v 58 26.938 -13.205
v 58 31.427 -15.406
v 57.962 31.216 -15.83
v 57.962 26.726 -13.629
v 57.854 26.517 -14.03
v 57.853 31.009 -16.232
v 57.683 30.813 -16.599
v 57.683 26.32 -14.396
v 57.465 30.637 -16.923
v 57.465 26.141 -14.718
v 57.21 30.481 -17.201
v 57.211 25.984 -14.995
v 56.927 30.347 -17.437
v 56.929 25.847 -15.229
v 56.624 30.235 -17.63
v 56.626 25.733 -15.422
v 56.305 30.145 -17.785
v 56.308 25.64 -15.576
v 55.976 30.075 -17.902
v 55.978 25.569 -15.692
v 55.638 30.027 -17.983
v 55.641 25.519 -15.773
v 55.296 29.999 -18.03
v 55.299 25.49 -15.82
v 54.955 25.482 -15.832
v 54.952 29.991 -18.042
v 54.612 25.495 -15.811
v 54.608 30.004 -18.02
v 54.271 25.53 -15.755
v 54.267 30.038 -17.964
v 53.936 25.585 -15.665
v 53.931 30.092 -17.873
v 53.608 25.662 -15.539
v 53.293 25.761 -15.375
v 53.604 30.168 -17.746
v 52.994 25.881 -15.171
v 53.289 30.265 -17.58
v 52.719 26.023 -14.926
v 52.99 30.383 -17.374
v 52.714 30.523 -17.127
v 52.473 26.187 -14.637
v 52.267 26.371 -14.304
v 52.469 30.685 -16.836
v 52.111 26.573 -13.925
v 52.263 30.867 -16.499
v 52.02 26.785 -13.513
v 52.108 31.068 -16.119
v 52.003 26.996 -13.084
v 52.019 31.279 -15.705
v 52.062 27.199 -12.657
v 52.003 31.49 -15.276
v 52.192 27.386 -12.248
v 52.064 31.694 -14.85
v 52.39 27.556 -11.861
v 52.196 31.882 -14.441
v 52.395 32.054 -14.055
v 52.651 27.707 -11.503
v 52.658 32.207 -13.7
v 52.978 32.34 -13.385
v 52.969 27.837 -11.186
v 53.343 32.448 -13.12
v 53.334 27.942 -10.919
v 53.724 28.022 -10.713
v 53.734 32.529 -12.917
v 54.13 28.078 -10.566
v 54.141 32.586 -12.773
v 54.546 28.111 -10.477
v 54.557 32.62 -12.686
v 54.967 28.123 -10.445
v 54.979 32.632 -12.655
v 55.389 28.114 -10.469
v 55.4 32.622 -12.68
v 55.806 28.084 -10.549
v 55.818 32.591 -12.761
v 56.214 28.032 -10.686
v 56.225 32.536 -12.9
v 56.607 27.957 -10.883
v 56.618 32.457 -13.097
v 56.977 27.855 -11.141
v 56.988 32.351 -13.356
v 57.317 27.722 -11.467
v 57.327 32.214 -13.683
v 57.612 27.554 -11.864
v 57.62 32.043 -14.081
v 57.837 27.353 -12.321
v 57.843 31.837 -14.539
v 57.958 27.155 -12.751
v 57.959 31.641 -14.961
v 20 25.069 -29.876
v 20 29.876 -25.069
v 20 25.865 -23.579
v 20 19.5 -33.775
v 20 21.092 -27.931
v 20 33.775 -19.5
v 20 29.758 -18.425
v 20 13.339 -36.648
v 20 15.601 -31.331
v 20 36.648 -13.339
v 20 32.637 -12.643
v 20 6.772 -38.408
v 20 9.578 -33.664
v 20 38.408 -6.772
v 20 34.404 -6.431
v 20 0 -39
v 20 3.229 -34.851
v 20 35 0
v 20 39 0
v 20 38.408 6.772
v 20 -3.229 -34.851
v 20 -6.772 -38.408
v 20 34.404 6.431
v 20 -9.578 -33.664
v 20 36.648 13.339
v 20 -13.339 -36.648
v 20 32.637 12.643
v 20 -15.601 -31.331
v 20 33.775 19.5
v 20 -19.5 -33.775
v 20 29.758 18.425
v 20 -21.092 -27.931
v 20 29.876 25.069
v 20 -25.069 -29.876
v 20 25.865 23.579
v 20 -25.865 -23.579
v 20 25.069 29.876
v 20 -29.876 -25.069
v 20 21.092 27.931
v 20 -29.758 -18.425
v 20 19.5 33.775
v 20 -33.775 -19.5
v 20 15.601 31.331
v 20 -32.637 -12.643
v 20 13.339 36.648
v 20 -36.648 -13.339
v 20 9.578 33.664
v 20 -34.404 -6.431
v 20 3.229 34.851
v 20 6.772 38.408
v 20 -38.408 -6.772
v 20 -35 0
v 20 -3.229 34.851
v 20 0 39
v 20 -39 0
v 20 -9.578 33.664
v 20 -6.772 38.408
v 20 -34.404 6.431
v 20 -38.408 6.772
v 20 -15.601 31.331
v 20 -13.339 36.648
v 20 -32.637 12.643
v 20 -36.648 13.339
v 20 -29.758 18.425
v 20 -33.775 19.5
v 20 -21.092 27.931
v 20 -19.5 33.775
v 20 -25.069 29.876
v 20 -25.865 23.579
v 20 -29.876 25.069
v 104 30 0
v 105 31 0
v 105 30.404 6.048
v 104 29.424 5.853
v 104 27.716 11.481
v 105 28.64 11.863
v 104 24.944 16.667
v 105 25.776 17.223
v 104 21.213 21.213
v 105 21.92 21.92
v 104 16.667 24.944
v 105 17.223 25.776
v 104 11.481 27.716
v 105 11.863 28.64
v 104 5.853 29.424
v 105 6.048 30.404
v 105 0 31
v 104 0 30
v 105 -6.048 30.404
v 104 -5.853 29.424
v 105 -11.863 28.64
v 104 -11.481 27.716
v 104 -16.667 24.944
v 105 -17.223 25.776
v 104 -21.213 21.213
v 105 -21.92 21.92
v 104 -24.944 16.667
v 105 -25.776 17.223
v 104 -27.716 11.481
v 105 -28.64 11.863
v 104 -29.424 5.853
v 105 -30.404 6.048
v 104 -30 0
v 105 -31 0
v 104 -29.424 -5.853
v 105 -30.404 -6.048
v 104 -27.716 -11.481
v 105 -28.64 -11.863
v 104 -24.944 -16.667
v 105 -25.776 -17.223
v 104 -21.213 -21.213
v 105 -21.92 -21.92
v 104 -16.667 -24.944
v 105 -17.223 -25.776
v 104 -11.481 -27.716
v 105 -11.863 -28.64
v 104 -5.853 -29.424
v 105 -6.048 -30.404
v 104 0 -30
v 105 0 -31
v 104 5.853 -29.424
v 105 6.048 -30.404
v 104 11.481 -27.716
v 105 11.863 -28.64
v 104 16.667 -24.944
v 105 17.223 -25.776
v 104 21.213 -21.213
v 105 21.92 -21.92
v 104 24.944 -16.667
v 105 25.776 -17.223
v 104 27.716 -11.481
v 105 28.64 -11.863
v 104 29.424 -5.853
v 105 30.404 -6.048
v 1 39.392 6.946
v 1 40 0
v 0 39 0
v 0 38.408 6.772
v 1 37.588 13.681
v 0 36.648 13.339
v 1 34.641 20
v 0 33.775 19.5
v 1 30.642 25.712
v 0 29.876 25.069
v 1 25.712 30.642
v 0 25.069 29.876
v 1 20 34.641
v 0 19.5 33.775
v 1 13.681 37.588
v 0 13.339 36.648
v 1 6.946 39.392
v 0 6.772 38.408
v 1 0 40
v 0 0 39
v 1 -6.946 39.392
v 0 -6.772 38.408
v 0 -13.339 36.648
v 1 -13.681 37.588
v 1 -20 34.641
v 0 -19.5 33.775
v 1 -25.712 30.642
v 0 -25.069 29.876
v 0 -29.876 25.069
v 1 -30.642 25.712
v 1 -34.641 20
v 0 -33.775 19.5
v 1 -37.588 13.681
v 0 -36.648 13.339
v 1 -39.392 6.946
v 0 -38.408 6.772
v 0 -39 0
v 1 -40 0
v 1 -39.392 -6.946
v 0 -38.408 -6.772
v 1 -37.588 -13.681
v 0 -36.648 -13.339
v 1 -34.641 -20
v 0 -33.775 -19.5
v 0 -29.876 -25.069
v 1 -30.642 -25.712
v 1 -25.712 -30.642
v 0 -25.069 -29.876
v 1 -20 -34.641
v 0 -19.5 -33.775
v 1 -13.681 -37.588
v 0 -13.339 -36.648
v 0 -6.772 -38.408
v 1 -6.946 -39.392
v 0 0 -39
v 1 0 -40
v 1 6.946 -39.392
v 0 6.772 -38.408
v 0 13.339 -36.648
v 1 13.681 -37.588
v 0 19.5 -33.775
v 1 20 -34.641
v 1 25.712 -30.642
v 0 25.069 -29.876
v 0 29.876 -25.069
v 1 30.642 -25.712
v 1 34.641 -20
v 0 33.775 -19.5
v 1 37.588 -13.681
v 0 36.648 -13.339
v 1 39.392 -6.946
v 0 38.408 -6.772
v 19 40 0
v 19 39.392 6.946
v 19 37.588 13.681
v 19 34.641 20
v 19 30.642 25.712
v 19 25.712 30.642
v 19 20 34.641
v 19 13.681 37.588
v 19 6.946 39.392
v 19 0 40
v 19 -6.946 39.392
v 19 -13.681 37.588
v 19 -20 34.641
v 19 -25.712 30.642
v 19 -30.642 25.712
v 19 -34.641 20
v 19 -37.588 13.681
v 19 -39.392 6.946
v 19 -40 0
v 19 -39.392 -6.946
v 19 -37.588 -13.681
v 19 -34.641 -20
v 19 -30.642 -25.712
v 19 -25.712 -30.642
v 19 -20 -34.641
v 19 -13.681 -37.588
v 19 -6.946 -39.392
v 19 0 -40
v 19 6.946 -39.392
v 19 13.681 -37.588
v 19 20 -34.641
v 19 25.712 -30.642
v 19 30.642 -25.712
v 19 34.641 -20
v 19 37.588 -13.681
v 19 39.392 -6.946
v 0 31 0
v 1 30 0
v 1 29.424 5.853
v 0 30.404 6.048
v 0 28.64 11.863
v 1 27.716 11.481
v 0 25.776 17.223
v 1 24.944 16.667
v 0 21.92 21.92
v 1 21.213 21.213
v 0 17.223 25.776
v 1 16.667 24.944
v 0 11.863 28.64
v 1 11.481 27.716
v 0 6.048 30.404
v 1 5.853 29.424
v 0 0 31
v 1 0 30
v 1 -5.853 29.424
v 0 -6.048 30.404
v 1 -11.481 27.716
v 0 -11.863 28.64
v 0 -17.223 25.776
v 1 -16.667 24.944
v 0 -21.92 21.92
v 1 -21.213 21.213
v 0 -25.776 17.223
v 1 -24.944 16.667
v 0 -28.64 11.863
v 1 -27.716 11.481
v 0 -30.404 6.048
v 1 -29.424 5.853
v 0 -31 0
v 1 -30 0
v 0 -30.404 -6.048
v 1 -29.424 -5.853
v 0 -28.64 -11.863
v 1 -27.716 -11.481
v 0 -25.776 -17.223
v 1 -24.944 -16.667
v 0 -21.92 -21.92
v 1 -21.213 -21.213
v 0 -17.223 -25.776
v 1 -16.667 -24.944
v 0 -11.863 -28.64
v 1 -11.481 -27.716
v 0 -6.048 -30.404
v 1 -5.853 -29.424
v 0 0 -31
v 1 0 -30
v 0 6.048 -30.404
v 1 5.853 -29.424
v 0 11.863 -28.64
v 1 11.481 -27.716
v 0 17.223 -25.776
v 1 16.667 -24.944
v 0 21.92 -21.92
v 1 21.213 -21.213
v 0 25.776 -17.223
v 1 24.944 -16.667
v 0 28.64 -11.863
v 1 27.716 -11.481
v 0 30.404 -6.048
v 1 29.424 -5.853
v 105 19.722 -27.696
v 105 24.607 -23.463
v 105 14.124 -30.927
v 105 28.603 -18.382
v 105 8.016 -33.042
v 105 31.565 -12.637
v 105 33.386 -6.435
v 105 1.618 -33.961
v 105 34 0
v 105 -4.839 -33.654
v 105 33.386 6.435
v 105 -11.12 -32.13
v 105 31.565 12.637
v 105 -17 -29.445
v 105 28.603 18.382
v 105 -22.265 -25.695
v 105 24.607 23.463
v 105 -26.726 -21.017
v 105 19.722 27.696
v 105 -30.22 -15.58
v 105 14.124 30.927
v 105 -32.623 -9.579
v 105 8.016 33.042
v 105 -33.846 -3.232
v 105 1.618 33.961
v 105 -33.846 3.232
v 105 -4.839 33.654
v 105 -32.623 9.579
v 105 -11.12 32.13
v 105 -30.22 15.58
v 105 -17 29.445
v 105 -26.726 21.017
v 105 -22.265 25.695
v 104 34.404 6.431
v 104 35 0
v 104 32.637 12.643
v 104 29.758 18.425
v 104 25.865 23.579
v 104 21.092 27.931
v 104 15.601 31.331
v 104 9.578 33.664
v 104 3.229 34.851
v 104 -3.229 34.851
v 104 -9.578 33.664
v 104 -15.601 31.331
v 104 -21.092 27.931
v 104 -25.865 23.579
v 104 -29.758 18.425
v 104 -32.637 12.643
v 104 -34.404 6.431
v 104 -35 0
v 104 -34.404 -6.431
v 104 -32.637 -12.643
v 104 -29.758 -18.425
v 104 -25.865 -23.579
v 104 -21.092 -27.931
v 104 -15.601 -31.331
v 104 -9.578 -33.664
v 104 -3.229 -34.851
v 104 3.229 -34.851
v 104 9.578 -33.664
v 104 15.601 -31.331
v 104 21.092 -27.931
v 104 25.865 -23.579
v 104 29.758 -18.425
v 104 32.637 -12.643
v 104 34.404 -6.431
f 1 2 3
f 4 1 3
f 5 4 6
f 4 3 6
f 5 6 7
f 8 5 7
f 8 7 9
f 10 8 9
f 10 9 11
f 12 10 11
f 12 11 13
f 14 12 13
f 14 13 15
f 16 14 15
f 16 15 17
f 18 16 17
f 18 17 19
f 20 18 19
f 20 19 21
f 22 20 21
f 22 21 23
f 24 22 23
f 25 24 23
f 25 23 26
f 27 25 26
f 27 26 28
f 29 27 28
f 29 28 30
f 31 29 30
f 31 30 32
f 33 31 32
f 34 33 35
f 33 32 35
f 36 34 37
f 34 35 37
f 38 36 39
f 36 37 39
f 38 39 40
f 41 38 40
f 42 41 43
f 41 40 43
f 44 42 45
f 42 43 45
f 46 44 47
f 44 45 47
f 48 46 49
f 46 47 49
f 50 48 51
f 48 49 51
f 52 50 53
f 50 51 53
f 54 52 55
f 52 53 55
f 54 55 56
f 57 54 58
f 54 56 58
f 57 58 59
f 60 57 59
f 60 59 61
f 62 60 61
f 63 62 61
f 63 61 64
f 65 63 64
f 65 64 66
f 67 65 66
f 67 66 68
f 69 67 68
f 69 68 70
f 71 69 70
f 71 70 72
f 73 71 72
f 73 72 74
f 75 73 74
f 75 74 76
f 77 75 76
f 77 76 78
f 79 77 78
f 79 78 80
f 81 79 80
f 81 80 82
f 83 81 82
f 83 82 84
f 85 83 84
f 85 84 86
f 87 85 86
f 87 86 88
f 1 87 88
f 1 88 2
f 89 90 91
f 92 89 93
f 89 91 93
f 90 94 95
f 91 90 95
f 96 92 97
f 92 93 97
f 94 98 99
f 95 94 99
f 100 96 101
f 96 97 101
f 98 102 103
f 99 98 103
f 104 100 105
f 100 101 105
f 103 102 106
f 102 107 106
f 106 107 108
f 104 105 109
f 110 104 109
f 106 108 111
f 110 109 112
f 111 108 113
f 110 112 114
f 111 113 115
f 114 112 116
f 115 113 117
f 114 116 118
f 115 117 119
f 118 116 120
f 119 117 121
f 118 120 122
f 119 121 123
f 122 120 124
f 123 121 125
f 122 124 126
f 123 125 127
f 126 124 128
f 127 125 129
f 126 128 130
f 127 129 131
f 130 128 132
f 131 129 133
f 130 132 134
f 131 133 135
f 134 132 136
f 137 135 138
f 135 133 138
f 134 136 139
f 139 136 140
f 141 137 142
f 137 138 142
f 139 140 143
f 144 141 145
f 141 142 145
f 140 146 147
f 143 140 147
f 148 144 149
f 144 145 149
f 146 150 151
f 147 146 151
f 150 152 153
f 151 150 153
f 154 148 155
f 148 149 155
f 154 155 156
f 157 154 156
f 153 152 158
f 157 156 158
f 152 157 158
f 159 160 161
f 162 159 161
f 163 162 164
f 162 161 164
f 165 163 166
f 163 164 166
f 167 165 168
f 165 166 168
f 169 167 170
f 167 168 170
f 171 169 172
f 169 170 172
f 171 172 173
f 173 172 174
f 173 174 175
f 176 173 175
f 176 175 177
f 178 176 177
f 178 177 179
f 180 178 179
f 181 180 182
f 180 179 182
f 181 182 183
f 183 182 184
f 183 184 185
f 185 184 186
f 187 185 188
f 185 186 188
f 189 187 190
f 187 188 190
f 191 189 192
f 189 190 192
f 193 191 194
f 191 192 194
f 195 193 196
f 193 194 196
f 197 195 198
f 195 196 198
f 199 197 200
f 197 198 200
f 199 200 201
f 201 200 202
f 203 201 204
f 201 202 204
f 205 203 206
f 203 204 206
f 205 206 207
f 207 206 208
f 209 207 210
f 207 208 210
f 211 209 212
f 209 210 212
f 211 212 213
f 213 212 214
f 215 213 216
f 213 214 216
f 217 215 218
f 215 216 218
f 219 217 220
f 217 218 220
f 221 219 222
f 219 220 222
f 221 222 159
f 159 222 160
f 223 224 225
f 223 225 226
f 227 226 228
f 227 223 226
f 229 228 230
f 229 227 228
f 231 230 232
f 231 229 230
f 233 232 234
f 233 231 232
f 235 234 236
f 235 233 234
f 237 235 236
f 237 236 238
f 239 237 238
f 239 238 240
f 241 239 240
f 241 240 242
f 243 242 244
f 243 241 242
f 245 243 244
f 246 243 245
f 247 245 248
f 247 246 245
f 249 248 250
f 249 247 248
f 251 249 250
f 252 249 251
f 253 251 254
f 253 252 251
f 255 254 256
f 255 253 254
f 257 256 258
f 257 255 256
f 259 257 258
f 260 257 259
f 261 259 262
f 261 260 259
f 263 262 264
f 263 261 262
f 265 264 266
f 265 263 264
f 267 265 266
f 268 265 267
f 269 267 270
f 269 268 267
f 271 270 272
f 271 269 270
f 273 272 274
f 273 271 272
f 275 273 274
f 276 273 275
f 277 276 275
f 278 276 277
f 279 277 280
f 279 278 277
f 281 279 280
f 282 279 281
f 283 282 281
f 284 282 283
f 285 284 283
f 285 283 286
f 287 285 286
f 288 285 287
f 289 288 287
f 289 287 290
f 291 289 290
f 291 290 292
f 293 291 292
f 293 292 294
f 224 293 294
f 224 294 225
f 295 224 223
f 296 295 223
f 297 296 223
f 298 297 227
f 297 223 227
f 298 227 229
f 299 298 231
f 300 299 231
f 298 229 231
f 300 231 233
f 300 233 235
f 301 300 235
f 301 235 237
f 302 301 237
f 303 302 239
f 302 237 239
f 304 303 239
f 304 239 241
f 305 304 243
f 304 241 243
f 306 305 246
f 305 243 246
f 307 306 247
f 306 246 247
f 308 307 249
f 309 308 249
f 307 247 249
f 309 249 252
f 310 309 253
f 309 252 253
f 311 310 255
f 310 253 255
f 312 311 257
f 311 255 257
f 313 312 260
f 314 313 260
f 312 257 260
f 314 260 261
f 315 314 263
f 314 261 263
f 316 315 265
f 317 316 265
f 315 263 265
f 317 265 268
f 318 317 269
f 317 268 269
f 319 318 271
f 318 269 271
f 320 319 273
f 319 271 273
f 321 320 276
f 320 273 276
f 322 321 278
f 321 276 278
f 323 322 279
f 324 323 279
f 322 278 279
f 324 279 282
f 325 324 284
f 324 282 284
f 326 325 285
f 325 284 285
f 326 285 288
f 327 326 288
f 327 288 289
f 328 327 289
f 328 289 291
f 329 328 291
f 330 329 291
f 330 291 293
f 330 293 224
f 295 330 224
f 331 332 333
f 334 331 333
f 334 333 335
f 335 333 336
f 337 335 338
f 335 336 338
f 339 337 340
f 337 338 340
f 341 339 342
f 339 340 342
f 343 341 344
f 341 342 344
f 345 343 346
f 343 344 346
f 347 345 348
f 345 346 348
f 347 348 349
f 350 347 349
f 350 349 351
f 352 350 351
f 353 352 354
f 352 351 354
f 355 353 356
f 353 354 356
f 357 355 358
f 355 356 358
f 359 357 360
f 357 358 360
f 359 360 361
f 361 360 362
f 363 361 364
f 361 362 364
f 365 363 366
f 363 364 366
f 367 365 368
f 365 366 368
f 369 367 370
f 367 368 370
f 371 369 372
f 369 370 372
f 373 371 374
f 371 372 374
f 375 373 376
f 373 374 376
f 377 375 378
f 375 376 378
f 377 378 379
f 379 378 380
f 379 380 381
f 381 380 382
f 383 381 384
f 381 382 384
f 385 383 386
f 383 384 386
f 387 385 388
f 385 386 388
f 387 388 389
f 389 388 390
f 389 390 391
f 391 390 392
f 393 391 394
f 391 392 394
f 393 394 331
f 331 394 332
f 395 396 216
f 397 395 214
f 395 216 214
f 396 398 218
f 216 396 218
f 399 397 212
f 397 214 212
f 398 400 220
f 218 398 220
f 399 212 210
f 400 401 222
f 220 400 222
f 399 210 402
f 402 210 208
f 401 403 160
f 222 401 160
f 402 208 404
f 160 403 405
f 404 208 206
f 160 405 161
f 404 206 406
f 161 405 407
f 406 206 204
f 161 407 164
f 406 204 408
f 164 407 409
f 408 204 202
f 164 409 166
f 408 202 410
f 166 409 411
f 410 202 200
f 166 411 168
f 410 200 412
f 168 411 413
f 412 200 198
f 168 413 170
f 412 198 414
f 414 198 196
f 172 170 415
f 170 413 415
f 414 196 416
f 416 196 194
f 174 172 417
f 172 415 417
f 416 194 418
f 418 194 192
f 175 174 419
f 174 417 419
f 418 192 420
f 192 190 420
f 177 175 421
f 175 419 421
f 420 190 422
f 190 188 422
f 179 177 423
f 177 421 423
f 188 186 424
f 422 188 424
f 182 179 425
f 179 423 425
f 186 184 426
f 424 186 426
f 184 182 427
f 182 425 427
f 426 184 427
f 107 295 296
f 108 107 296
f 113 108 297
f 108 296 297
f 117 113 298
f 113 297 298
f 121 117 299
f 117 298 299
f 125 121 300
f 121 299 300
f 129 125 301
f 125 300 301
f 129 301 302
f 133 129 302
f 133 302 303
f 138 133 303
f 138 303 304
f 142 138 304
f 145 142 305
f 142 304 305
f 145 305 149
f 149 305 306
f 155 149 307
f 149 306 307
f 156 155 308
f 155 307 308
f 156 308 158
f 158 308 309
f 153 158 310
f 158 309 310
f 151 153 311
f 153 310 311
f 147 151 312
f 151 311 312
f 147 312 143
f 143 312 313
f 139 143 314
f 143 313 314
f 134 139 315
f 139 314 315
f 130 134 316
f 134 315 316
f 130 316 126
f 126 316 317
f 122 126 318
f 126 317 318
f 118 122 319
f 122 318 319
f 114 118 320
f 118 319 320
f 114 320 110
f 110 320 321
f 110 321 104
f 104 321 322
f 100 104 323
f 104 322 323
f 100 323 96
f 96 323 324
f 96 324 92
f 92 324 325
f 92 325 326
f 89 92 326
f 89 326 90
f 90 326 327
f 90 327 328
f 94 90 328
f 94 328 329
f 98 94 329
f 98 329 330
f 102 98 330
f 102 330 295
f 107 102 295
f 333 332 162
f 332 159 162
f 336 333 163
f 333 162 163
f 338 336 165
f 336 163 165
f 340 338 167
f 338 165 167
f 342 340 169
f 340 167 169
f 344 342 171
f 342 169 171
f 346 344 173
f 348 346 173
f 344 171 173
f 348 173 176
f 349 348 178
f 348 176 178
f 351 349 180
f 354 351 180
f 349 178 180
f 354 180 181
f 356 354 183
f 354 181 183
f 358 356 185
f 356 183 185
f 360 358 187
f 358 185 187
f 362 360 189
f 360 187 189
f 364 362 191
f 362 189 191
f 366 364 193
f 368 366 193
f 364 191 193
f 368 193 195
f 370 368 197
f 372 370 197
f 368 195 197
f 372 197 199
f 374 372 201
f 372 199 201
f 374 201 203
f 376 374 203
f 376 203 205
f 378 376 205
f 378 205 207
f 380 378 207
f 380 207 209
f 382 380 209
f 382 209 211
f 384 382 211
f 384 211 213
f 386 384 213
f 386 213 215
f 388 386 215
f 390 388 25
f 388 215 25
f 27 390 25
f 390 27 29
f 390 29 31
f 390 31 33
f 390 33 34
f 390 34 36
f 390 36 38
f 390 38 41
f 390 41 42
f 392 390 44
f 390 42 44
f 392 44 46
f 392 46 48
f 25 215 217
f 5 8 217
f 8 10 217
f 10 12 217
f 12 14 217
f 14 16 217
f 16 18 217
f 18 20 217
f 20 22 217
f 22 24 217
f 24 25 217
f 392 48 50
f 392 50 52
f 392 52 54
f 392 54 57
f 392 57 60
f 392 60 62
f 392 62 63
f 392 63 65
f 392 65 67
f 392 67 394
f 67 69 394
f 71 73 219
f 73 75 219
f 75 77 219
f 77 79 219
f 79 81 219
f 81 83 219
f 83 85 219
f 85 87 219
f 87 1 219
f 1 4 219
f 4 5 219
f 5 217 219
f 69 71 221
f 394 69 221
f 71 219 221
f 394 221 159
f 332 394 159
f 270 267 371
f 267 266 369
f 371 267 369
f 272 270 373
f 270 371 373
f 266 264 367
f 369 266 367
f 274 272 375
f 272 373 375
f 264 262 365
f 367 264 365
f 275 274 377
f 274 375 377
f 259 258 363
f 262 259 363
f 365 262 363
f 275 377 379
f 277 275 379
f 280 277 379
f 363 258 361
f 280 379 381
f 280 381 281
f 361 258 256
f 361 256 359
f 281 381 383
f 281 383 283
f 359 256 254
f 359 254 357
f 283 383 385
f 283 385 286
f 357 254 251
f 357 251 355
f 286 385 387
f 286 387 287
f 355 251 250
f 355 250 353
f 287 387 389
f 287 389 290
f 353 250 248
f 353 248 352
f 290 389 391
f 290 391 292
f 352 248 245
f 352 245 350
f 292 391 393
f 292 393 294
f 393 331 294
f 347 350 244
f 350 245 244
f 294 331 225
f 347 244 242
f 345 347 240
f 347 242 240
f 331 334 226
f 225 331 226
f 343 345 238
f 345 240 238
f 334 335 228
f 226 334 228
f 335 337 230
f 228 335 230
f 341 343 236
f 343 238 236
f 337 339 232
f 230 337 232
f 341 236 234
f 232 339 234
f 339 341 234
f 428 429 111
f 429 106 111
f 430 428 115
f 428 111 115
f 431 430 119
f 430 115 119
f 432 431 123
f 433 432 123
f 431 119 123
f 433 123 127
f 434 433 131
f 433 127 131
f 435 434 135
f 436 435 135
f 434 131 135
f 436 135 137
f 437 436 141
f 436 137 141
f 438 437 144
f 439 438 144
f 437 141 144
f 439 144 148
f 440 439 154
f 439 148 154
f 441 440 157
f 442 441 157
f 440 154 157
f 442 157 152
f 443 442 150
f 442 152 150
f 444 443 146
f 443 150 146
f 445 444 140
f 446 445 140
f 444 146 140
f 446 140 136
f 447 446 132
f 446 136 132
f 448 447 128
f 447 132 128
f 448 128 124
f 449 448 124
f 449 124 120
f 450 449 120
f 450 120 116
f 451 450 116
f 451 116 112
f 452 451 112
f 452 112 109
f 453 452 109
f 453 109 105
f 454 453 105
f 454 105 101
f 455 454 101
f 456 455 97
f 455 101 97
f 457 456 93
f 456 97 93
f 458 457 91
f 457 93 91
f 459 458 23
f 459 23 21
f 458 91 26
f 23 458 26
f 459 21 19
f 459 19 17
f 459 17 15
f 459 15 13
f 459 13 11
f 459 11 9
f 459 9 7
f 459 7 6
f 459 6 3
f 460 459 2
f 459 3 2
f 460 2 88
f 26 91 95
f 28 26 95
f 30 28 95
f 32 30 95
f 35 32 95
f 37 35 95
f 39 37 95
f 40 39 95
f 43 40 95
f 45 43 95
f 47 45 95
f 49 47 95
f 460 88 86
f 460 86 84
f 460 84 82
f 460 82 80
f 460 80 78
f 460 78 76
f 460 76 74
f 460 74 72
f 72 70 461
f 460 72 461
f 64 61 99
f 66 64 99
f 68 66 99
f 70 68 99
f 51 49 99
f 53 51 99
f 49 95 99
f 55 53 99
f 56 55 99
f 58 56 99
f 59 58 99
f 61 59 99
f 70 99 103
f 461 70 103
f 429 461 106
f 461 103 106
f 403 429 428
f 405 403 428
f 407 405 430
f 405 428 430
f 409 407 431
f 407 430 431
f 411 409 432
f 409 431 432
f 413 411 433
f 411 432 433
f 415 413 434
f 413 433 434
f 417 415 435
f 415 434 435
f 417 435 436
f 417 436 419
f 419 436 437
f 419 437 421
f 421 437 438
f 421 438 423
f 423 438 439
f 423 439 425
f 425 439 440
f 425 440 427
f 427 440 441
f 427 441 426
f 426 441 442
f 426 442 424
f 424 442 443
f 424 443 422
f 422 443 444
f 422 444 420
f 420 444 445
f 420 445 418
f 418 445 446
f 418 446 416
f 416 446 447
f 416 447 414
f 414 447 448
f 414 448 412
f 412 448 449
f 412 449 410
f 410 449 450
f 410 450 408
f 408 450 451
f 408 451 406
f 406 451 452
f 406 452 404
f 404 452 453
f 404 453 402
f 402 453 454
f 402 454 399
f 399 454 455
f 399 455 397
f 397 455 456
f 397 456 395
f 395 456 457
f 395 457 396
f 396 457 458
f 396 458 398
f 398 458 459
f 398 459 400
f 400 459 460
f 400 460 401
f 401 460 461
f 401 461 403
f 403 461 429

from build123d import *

# Parameters (mm, degrees)
CHAMFER_1_SIZE           = 1
SKETCH_2_R               = 3
CUT_EXTRUDE_1_DEPTH      = 10
CUT_EXTRUDE_1_DEPTH_BACK = 108


with BuildPart() as part:
    # Эскиз1 → Повернуть1 (revolve)
    with BuildSketch(Plane.XY):
        Polygon((0, 40), (0, 30), (105, 30), (105, 35), (20, 35), (20, 40), align=None)
    revolve(axis=Axis((0, 0, 0), (1, 0, 0)))

    # Фаска1
    chamfer_1_edges = [part.edges().sort_by_distance(p)[0] for p in [
        (20, -40, 0),
        (105, -35, 0),
        (105, -30, 0),
        (0, -30, 0),
        (0, -40, 0),
    ]]
    chamfer(chamfer_1_edges, length=CHAMFER_1_SIZE)

    # Эскиз2 → Вырез-Вытянуть1 (cut, two sides)
    with BuildSketch(Plane(origin=(110, 102, -50), x_dir=(1, 0, 0), z_dir=(0, 0.897920723, -0.440157217))) as cut_extrude_1_sk:
        with Locations((-55, 0)):
            Circle(SKETCH_2_R)
    extrude(amount=CUT_EXTRUDE_1_DEPTH, mode=Mode.SUBTRACT)
    extrude(cut_extrude_1_sk.sketch, amount=-CUT_EXTRUDE_1_DEPTH_BACK, mode=Mode.SUBTRACT)


solid = part.part
